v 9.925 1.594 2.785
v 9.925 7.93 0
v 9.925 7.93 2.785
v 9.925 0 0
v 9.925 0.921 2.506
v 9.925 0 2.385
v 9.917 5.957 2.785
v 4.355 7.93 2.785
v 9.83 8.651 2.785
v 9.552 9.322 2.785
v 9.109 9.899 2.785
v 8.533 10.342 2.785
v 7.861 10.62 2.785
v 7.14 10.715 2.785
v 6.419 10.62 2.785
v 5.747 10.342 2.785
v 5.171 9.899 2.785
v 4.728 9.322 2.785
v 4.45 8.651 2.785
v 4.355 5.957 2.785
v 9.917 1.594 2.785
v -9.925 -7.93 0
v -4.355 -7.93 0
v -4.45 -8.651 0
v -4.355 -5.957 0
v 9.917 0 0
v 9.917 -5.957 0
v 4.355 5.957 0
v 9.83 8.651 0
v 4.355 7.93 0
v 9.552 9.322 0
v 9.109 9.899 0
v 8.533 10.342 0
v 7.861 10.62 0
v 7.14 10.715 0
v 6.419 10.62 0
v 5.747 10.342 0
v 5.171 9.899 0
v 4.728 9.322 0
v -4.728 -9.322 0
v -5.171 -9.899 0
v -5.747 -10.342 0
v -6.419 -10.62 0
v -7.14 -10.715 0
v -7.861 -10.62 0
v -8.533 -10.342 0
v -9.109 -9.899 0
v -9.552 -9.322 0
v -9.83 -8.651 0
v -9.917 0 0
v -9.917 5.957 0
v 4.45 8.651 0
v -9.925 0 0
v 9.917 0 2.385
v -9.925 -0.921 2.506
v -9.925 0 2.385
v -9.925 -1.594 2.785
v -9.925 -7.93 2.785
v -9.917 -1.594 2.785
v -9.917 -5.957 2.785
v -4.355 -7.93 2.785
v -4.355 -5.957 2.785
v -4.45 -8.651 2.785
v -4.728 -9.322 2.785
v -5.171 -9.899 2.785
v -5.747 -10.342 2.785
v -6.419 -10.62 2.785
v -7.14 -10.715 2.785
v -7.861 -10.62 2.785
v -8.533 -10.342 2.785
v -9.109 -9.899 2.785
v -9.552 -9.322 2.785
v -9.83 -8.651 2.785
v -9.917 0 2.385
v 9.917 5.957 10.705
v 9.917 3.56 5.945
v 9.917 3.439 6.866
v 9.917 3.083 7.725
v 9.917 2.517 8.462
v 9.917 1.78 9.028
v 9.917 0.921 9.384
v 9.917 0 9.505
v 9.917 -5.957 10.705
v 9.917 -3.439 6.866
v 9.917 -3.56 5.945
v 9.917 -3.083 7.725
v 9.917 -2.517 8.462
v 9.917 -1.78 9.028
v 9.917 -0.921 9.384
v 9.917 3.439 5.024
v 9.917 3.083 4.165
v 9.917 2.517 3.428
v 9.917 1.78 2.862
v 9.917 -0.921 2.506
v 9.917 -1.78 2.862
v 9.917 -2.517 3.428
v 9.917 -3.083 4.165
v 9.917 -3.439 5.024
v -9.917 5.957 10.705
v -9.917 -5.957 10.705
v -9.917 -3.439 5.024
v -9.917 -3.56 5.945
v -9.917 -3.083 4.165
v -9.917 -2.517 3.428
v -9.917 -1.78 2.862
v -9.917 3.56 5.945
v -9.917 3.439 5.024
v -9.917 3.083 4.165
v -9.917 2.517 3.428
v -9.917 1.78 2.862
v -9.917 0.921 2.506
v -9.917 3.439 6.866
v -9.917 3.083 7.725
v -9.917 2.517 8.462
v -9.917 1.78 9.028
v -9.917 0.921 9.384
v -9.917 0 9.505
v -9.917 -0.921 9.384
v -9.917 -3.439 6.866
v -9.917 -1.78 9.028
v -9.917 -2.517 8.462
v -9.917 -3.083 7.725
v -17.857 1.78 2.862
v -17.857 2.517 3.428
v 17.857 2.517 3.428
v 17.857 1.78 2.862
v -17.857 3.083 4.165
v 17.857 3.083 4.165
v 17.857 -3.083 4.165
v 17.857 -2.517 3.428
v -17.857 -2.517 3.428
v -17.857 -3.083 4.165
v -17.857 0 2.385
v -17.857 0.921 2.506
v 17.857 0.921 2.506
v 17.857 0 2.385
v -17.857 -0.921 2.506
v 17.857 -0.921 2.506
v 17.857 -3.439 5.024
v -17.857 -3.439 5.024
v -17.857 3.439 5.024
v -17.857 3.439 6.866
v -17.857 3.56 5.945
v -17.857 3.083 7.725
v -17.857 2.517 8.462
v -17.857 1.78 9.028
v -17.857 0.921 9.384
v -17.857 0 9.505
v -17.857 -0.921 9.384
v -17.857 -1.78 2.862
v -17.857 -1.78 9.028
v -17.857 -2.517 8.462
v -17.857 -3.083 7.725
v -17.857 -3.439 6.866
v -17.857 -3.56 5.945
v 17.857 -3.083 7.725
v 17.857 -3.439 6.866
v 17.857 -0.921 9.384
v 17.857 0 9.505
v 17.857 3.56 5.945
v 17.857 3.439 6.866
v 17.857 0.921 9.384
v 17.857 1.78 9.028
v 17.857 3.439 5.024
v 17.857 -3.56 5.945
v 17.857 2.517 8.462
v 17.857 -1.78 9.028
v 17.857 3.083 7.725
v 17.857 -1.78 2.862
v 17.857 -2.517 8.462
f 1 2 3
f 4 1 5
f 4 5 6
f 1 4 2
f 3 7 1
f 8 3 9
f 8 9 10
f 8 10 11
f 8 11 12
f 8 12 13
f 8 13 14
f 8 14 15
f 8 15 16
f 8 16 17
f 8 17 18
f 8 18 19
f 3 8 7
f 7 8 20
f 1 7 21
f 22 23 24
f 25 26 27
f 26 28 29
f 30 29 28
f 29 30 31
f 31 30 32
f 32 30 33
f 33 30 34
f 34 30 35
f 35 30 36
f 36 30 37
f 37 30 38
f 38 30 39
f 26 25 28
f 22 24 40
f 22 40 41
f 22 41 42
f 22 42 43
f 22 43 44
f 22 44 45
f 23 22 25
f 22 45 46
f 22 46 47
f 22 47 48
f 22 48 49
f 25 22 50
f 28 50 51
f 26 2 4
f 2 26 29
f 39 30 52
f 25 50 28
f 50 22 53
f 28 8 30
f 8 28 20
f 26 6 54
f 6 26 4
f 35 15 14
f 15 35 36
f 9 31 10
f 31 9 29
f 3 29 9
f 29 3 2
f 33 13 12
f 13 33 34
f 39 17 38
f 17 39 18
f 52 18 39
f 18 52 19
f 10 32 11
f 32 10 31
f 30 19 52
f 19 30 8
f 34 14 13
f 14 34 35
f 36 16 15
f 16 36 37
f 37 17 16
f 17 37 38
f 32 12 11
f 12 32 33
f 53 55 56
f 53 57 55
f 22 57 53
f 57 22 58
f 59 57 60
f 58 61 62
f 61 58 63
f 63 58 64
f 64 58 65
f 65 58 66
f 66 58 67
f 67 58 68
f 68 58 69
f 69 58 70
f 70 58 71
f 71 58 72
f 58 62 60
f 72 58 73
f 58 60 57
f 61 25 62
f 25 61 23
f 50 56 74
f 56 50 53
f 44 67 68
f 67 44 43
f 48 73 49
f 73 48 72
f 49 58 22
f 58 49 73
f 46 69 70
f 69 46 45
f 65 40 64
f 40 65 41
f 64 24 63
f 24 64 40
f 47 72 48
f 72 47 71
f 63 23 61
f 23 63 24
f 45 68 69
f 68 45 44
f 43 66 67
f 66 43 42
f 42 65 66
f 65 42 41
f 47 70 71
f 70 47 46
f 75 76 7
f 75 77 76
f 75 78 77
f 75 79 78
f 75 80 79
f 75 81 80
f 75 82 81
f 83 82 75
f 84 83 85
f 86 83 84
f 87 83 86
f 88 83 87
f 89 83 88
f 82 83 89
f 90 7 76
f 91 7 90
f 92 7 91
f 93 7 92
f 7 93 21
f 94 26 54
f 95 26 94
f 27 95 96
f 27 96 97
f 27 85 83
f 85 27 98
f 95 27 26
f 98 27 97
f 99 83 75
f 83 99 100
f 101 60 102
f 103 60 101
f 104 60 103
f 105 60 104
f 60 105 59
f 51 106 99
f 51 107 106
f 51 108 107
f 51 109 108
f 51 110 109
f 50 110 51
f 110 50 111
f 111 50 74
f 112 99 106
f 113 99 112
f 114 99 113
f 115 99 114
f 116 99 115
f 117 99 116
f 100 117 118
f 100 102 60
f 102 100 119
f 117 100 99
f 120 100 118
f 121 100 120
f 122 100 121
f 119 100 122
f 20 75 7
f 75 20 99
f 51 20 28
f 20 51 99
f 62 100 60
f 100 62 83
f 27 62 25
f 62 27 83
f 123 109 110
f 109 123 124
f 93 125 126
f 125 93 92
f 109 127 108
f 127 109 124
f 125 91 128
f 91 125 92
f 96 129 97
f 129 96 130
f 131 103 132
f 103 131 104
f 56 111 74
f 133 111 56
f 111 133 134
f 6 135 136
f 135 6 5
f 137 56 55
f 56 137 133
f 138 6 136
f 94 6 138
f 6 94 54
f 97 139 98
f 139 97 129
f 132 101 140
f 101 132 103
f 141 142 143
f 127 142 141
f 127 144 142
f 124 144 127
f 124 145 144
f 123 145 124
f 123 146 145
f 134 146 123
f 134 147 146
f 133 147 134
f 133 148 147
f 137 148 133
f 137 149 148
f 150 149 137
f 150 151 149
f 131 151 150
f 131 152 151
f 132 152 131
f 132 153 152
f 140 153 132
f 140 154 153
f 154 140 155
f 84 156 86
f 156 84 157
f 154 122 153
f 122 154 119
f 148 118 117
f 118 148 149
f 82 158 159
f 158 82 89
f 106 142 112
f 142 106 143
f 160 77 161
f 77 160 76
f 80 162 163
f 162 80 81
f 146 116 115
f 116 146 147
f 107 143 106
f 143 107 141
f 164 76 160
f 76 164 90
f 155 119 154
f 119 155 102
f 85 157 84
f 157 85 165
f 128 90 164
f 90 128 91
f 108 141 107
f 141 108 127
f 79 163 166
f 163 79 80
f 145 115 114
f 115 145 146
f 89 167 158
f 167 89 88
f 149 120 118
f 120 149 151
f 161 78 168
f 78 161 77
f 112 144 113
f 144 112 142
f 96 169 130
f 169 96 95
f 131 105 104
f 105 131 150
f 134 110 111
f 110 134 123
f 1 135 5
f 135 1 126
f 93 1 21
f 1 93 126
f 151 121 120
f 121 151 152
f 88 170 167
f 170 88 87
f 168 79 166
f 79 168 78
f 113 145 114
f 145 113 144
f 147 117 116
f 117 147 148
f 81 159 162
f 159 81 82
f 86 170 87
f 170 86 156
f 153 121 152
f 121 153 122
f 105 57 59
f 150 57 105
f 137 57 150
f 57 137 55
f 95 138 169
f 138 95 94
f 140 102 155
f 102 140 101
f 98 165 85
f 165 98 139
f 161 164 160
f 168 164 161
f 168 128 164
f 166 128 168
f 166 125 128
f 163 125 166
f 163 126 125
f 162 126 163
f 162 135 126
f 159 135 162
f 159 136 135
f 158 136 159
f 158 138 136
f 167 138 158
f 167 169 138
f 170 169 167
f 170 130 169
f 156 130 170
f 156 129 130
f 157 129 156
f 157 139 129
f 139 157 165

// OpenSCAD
// Metal-Mite Aluminum Housed chassis-mount resistor
// 89 Series

render_model=0;

// 810F5R0
// 10W, 5.0 Ohms

module MetalMite_810F5R0(detail=0,tolScale=1.0) {
  dimA=34.93; dimA_tol=1.57;  // terminal tip to terminal tip length
  dimB=15.88; dimB_tol=0.25;  // mount hole to mount hole width
  dimC=2.39; dimC_tol=0.79;   // mount hole center to chassis outer radius
  dimD=14.28; dimD_tol=0.25;  // mount hole to mount hole length
  dimE=19.05; dimE_tol=1.57;  // chassis length
  dimF=7.93; dimF_tol=1.57;   // chassis to terminal tip length
  dimG=11.13; dimG_tol=1.57;  // chassis width
  dimH=7.93; dimH_tol=0.79;   // center line to mount hole center width
  dimJ=20.63; dimJ_tol=0.79;  // mount hole edge to mount hole edge outer width
  dimK=2.39; dimK_tol=0.13;   // mount hole diameter
  dimL=10.31; dimL_tol=0.79;  // chassis height
  dimM=5.16; dimM_tol=1.57;   // chassis flat to center line height
  dimN=2.39; dimN_tol=0.79;   // mount hole height
  dimP=2.16; dimP_tol=0.13;   // terminal hole diameter
  QminAWG=12;                 // terminal wire diameter
  dimR=3.56; dimR_tol=0.0;    // terminal wire clearance radius

  if(detail==0) union() {
    translate([-(dimE+tolScale*dimE_tol)/2,-(dimG+tolScale*dimG_tol)/2,0])
      cube(size=[dimE+tolScale*dimE_tol
        , dimG+tolScale*dimG_tol
        ,dimL+tolScale*dimL_tol],center=false);
    translate([dimD/2,0,0]) {
      translate([-(dimC+tolScale*dimC_tol),0,0])
        cube(size=[2*(dimC+tolScale*dimC_tol)
          ,(dimH)
          ,(dimN+tolScale*dimN_tol)],center=false);
      translate([0,dimH,0]) cylinder($fs=0.1, $fa=15.0
		, r=dimC+tolScale*dimC_tol
		, h=dimN+tolScale*dimN_tol
		, center=false);
    }
    translate([-dimD/2,0,0]) rotate([0,0,180]) {
      translate([-(dimC+tolScale*dimC_tol),0,0])
        cube(size=[2*(dimC+tolScale*dimC_tol)
          ,(dimH)
          ,(dimN+tolScale*dimN_tol)],center=false);
      translate([0,dimH,0]) cylinder($fs=0.1, $fa=15.0
		, r=dimC+tolScale*dimC_tol
		, h=dimN+tolScale*dimN_tol
		, center=false);
    }
    translate([0,0,dimM+tolScale*dimM_tol]) rotate([0,90,0])
      cylinder($fs=0.1, $fa=15.0, r=dimR+tolScale*dimR_tol
        ,h=dimA+tolScale*dimA_tol,center=true);
  }
}

if(render_model==0) {
  echo("Rendering simple MetalMite_810F5R0 model; detail=0...");
  MetalMite_810F5R0(detail=0,tolScale=0.5);
}
